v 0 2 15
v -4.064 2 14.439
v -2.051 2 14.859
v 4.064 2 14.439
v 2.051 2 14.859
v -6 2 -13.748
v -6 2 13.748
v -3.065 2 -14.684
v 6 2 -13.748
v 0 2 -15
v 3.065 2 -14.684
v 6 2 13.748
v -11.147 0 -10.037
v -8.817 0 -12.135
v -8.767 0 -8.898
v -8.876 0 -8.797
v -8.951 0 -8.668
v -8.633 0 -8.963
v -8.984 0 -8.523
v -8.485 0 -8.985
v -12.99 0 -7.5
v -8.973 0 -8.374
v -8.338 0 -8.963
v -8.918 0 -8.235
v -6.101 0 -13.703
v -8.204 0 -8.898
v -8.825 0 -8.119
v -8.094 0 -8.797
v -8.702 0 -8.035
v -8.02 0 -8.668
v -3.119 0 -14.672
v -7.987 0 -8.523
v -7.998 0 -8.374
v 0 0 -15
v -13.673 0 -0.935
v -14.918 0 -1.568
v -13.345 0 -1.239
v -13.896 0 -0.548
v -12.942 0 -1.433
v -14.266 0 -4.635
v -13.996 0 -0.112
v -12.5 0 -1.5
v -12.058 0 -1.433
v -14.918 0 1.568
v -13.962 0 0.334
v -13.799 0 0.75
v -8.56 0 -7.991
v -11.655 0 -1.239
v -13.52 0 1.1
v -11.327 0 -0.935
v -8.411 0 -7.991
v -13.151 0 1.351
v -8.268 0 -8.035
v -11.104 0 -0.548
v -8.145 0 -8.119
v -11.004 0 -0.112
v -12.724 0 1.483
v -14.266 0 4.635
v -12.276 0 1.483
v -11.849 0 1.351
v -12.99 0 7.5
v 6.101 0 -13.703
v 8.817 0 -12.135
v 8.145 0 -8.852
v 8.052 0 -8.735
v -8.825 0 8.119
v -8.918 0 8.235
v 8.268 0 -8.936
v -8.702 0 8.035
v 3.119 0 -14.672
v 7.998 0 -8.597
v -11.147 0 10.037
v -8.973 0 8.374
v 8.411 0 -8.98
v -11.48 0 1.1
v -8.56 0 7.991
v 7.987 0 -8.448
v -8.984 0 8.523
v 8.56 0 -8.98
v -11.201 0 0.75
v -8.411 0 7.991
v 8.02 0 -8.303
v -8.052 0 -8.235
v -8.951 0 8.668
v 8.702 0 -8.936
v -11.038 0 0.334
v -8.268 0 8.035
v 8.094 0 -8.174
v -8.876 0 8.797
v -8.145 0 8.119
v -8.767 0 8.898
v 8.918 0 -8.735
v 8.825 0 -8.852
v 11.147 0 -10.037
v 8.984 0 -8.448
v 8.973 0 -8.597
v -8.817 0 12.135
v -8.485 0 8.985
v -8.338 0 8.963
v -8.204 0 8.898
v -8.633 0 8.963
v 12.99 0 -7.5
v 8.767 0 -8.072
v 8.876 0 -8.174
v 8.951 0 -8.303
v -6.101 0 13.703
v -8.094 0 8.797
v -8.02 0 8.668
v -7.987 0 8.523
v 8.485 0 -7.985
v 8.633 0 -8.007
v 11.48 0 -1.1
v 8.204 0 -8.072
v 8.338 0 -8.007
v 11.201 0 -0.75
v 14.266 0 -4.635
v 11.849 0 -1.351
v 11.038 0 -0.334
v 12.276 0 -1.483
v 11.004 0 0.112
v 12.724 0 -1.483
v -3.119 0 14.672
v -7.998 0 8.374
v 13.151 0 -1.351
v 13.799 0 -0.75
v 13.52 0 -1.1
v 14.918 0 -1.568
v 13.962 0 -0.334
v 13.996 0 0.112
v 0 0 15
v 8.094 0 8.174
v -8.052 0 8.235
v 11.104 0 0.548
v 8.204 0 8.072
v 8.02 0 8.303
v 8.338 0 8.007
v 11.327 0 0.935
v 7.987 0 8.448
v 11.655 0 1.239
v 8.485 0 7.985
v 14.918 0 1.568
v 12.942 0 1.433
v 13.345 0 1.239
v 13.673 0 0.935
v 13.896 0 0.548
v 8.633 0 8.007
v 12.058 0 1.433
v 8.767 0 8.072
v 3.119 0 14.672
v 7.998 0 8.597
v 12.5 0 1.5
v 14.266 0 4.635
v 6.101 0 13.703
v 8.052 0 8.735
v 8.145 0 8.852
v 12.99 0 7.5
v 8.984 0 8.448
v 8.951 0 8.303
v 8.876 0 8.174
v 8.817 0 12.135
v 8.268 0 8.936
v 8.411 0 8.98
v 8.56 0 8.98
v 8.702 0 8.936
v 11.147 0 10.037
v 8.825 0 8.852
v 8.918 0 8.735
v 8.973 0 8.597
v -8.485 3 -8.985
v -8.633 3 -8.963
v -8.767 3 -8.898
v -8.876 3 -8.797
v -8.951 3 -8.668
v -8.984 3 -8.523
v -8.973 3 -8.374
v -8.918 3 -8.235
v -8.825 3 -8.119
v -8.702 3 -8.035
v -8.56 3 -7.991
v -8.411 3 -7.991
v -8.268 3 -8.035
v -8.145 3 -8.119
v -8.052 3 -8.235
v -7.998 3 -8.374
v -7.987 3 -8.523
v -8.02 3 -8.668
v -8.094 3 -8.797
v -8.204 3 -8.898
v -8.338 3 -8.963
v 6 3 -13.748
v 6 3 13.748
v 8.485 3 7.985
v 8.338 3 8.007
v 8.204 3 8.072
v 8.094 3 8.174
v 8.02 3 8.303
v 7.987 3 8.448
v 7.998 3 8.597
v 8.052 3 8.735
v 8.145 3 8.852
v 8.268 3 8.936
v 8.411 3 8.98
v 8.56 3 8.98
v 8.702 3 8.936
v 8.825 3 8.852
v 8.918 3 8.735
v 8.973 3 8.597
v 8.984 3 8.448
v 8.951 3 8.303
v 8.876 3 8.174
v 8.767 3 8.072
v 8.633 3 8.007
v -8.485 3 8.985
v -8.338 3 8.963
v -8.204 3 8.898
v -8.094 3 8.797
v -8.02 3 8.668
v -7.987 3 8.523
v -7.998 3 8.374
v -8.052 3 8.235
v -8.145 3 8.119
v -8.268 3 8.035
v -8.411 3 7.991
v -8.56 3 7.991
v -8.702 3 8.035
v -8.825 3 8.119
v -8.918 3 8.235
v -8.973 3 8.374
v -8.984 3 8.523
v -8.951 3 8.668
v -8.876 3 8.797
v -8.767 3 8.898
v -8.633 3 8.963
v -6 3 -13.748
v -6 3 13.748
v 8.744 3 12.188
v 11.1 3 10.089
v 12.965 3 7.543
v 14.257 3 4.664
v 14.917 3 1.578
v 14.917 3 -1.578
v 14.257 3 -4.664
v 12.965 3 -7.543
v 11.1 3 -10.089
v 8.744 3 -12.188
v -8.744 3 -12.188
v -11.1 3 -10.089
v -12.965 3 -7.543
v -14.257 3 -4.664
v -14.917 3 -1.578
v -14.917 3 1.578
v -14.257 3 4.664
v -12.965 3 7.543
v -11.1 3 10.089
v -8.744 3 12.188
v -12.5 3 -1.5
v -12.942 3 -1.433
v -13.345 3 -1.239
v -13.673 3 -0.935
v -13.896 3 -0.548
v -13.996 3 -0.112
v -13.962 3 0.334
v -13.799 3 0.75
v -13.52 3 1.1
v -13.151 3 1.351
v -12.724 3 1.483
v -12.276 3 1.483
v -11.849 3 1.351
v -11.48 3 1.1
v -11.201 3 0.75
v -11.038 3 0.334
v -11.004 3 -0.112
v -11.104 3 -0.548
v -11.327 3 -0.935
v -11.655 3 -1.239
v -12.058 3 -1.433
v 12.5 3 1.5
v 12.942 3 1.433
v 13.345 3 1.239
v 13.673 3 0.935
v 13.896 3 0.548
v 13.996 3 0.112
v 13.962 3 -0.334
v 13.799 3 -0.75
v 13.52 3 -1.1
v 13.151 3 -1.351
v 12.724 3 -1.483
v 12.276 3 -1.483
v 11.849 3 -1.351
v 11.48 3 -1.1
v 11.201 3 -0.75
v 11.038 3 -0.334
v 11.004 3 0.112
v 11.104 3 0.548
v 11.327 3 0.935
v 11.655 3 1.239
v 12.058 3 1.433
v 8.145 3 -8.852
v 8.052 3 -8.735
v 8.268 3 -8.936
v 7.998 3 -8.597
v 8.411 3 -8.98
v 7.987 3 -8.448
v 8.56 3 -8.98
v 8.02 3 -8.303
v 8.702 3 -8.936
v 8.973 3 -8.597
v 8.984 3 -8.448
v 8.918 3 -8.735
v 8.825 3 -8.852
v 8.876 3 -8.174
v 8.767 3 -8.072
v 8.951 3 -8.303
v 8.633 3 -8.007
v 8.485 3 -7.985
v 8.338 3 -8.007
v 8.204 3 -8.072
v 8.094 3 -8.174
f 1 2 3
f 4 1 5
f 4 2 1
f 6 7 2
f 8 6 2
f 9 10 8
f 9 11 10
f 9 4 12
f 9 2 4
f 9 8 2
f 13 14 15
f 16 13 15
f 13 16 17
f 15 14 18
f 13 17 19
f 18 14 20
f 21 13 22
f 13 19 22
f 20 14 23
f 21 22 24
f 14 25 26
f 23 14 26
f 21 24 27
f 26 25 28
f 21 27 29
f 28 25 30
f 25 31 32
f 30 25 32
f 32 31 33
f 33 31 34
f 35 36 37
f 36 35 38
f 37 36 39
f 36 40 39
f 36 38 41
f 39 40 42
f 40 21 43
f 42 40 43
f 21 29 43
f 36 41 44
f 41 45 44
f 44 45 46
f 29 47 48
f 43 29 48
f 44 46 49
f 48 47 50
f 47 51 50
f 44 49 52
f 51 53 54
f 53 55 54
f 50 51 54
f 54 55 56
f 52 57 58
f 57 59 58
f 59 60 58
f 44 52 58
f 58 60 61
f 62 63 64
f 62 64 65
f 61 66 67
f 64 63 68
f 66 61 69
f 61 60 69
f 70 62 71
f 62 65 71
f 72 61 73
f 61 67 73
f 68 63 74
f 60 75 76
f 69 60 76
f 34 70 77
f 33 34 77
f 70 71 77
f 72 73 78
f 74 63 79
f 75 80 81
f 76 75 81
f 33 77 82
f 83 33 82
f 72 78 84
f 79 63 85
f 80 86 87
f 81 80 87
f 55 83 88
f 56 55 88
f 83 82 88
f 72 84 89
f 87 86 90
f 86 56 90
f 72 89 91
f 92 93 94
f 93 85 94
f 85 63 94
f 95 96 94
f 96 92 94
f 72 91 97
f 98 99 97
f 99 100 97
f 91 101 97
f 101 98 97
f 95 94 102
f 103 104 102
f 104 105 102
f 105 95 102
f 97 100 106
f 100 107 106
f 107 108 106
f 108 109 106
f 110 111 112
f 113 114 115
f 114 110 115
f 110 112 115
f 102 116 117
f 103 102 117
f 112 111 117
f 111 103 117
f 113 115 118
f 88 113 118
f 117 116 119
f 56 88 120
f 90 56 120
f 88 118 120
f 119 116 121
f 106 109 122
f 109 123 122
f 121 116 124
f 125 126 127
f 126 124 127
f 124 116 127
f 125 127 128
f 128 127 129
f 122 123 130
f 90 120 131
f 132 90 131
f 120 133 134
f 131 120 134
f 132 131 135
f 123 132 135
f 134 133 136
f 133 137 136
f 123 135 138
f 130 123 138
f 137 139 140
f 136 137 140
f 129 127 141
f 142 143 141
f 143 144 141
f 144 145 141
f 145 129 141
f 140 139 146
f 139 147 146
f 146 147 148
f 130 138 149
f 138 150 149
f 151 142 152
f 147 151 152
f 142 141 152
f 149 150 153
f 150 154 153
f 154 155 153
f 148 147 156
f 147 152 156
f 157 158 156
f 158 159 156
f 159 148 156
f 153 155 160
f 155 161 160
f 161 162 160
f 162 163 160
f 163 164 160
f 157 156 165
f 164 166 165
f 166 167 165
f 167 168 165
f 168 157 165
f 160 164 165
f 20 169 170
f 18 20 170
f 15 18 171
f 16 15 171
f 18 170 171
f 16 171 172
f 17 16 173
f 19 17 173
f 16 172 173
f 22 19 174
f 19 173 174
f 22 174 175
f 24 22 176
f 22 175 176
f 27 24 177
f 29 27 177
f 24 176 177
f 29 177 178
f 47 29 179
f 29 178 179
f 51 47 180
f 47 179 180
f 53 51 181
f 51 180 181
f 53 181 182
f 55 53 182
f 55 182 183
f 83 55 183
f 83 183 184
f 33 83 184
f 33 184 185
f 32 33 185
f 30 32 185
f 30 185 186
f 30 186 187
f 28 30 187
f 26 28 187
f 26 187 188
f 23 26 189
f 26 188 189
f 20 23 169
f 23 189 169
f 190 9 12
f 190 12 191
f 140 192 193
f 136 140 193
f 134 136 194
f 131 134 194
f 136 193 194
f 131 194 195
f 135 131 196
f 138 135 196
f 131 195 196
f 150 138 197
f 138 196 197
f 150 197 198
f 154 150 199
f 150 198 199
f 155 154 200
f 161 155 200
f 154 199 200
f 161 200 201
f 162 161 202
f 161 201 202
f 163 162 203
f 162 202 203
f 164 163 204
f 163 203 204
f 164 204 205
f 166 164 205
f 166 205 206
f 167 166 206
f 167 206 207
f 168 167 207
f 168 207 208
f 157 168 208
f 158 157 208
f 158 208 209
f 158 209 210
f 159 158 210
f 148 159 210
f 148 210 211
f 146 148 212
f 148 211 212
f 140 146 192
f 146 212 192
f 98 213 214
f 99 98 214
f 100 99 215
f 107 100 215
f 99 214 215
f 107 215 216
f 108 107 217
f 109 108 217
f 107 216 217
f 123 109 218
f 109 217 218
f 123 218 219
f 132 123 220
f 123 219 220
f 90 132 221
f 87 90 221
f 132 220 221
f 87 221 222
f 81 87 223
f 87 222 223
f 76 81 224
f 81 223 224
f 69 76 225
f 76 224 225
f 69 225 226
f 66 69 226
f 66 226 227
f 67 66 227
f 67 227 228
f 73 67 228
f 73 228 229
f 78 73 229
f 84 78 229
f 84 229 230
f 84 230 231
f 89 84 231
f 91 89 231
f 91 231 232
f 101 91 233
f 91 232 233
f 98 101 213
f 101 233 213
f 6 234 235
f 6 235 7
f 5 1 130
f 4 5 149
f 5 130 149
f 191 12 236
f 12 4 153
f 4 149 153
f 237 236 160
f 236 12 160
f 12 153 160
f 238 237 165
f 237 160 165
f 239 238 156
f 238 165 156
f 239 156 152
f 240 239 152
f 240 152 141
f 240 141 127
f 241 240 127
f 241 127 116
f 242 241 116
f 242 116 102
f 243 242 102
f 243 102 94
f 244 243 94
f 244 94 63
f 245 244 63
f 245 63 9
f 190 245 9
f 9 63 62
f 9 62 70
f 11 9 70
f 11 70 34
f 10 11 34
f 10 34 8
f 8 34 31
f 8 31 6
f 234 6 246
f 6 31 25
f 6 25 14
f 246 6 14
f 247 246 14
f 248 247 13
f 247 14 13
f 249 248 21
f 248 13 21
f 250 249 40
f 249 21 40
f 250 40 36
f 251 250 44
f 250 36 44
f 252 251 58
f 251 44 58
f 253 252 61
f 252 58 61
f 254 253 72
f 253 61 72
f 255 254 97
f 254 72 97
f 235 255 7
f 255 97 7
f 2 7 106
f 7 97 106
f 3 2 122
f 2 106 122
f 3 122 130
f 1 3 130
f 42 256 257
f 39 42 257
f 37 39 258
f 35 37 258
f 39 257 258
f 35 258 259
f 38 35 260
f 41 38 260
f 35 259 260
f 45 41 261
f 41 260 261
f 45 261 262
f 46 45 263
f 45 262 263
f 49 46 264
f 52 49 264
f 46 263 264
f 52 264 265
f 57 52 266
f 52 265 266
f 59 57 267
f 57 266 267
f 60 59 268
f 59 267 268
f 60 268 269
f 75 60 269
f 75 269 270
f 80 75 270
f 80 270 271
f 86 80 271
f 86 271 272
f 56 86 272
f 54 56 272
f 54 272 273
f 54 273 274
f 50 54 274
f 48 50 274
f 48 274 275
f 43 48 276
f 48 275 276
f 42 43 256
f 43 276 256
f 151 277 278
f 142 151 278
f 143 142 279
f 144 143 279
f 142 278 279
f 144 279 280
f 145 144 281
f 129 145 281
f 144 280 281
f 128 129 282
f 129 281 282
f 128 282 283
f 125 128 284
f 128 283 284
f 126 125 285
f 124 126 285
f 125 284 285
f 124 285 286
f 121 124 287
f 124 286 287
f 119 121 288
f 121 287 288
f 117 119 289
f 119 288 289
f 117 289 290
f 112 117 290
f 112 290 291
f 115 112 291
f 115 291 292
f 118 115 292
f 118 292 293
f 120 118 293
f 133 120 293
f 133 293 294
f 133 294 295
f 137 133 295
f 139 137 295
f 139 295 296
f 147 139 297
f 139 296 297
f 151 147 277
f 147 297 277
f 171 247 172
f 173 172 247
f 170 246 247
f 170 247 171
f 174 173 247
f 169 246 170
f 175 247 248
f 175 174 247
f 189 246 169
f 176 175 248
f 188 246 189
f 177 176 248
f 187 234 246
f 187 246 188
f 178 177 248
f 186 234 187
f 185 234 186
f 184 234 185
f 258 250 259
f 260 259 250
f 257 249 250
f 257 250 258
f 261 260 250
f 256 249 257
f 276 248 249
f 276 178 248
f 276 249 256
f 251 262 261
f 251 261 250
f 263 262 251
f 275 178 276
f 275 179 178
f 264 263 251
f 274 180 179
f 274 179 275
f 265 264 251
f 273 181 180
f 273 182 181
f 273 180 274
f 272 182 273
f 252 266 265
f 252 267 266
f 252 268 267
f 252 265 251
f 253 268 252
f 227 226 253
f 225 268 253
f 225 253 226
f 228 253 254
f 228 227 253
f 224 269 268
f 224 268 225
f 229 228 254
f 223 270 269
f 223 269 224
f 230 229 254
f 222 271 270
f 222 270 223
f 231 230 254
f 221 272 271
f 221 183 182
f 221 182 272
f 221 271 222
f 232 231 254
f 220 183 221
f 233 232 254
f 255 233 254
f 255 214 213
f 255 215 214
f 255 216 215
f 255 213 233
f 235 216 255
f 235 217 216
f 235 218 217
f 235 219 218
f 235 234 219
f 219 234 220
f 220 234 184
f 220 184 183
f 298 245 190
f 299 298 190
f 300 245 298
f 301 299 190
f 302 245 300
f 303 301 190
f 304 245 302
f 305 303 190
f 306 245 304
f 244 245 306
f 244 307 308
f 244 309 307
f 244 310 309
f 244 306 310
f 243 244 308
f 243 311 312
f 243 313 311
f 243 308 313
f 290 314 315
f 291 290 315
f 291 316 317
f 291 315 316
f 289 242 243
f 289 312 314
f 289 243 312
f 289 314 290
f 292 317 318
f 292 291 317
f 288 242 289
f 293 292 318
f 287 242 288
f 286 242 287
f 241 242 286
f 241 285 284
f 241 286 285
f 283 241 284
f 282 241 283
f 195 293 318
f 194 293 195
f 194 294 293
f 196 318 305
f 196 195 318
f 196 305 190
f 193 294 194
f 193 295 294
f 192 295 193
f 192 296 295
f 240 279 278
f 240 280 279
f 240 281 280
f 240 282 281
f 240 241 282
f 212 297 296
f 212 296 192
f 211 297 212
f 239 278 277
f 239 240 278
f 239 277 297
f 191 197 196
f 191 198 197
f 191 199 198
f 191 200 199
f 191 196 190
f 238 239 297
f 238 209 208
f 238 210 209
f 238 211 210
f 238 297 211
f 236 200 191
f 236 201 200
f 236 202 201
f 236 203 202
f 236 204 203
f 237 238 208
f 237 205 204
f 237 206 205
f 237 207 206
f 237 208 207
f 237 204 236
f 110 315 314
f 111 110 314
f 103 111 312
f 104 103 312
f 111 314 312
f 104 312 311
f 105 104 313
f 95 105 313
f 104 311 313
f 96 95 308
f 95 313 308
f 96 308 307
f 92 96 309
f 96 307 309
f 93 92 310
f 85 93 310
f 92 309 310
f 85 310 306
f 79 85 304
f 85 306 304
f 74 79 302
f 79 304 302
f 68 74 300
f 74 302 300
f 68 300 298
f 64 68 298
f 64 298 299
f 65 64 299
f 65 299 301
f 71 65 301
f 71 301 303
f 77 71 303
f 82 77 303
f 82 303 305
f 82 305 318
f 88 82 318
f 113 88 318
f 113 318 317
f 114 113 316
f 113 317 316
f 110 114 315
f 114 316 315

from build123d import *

# Parameters (mm, degrees)
SKETCH_1_R               = 15
EXTRUDE_1_DEPTH          = 3
CUT_EXTRUDE_2_DEPTH      = 22.424285286
CUT_EXTRUDE_2_DEPTH_BACK = 22.424285286
SKETCH_3_R               = 1.5
CUT_EXTRUDE_3_DEPTH      = 3
SKETCH_4_R               = 0.5
CUT_EXTRUDE_4_DEPTH      = 3


with BuildPart() as part:
    # 草图1 → 凸台-拉伸1 (new body)
    with BuildSketch(Plane(origin=(0, 0, 0), x_dir=(1, 0, 0), z_dir=(0, 1, 0))):
        with Locations(Location((0, 0, 0), (0, 0, 270))):
            Circle(SKETCH_1_R)
    extrude(amount=EXTRUDE_1_DEPTH)

    # 草图2 → 切除-拉伸2 (cut, two sides: drawn at the far end of the back side and taken through both)
    with BuildSketch(Plane.XY.offset(-CUT_EXTRUDE_2_DEPTH_BACK)):
        Polygon((-6, 55.426406871), (-6, 3), (-6, 2), (6, 2), (6, 3), (6, 55.426406871), (6, 160.279220614), (-6, 160.279220614), align=None)
    extrude(amount=CUT_EXTRUDE_2_DEPTH + CUT_EXTRUDE_2_DEPTH_BACK, mode=Mode.SUBTRACT)

    # 草图3 → 切除-拉伸3 (cut)
    with BuildSketch(Plane(origin=(0, 3, 0), x_dir=(1, 0, 0), z_dir=(0, 1, 0))):
        with Locations(Location((12.5, 0, 0), (0, 0, 270))):
            Circle(SKETCH_3_R)
        with Locations(Location((-12.5, 0, 0), (0, 0, 90))):
            Circle(SKETCH_3_R)
    extrude(amount=-CUT_EXTRUDE_3_DEPTH, mode=Mode.SUBTRACT)

    # 草图4 → 切除-拉伸4 (cut)
    with BuildSketch(Plane(origin=(0, 3, 0), x_dir=(1, 0, 0), z_dir=(0, 1, 0))):
        with Locations(Location((8.485281374, 8.485281374, 0), (0, 0, 270))):
            Circle(SKETCH_4_R)
        with Locations(Location((-8.485281374, 8.485281374, 0), (0, 0, 90))):
            Circle(SKETCH_4_R)
        with Locations(Location((8.485281374, -8.485281374, 0), (0, 0, 90))):
            Circle(SKETCH_4_R)
        with Locations(Location((-8.485281374, -8.485281374, 0), (0, 0, 270))):
            Circle(SKETCH_4_R)
    extrude(amount=-CUT_EXTRUDE_4_DEPTH, mode=Mode.SUBTRACT)


solid = part.part
